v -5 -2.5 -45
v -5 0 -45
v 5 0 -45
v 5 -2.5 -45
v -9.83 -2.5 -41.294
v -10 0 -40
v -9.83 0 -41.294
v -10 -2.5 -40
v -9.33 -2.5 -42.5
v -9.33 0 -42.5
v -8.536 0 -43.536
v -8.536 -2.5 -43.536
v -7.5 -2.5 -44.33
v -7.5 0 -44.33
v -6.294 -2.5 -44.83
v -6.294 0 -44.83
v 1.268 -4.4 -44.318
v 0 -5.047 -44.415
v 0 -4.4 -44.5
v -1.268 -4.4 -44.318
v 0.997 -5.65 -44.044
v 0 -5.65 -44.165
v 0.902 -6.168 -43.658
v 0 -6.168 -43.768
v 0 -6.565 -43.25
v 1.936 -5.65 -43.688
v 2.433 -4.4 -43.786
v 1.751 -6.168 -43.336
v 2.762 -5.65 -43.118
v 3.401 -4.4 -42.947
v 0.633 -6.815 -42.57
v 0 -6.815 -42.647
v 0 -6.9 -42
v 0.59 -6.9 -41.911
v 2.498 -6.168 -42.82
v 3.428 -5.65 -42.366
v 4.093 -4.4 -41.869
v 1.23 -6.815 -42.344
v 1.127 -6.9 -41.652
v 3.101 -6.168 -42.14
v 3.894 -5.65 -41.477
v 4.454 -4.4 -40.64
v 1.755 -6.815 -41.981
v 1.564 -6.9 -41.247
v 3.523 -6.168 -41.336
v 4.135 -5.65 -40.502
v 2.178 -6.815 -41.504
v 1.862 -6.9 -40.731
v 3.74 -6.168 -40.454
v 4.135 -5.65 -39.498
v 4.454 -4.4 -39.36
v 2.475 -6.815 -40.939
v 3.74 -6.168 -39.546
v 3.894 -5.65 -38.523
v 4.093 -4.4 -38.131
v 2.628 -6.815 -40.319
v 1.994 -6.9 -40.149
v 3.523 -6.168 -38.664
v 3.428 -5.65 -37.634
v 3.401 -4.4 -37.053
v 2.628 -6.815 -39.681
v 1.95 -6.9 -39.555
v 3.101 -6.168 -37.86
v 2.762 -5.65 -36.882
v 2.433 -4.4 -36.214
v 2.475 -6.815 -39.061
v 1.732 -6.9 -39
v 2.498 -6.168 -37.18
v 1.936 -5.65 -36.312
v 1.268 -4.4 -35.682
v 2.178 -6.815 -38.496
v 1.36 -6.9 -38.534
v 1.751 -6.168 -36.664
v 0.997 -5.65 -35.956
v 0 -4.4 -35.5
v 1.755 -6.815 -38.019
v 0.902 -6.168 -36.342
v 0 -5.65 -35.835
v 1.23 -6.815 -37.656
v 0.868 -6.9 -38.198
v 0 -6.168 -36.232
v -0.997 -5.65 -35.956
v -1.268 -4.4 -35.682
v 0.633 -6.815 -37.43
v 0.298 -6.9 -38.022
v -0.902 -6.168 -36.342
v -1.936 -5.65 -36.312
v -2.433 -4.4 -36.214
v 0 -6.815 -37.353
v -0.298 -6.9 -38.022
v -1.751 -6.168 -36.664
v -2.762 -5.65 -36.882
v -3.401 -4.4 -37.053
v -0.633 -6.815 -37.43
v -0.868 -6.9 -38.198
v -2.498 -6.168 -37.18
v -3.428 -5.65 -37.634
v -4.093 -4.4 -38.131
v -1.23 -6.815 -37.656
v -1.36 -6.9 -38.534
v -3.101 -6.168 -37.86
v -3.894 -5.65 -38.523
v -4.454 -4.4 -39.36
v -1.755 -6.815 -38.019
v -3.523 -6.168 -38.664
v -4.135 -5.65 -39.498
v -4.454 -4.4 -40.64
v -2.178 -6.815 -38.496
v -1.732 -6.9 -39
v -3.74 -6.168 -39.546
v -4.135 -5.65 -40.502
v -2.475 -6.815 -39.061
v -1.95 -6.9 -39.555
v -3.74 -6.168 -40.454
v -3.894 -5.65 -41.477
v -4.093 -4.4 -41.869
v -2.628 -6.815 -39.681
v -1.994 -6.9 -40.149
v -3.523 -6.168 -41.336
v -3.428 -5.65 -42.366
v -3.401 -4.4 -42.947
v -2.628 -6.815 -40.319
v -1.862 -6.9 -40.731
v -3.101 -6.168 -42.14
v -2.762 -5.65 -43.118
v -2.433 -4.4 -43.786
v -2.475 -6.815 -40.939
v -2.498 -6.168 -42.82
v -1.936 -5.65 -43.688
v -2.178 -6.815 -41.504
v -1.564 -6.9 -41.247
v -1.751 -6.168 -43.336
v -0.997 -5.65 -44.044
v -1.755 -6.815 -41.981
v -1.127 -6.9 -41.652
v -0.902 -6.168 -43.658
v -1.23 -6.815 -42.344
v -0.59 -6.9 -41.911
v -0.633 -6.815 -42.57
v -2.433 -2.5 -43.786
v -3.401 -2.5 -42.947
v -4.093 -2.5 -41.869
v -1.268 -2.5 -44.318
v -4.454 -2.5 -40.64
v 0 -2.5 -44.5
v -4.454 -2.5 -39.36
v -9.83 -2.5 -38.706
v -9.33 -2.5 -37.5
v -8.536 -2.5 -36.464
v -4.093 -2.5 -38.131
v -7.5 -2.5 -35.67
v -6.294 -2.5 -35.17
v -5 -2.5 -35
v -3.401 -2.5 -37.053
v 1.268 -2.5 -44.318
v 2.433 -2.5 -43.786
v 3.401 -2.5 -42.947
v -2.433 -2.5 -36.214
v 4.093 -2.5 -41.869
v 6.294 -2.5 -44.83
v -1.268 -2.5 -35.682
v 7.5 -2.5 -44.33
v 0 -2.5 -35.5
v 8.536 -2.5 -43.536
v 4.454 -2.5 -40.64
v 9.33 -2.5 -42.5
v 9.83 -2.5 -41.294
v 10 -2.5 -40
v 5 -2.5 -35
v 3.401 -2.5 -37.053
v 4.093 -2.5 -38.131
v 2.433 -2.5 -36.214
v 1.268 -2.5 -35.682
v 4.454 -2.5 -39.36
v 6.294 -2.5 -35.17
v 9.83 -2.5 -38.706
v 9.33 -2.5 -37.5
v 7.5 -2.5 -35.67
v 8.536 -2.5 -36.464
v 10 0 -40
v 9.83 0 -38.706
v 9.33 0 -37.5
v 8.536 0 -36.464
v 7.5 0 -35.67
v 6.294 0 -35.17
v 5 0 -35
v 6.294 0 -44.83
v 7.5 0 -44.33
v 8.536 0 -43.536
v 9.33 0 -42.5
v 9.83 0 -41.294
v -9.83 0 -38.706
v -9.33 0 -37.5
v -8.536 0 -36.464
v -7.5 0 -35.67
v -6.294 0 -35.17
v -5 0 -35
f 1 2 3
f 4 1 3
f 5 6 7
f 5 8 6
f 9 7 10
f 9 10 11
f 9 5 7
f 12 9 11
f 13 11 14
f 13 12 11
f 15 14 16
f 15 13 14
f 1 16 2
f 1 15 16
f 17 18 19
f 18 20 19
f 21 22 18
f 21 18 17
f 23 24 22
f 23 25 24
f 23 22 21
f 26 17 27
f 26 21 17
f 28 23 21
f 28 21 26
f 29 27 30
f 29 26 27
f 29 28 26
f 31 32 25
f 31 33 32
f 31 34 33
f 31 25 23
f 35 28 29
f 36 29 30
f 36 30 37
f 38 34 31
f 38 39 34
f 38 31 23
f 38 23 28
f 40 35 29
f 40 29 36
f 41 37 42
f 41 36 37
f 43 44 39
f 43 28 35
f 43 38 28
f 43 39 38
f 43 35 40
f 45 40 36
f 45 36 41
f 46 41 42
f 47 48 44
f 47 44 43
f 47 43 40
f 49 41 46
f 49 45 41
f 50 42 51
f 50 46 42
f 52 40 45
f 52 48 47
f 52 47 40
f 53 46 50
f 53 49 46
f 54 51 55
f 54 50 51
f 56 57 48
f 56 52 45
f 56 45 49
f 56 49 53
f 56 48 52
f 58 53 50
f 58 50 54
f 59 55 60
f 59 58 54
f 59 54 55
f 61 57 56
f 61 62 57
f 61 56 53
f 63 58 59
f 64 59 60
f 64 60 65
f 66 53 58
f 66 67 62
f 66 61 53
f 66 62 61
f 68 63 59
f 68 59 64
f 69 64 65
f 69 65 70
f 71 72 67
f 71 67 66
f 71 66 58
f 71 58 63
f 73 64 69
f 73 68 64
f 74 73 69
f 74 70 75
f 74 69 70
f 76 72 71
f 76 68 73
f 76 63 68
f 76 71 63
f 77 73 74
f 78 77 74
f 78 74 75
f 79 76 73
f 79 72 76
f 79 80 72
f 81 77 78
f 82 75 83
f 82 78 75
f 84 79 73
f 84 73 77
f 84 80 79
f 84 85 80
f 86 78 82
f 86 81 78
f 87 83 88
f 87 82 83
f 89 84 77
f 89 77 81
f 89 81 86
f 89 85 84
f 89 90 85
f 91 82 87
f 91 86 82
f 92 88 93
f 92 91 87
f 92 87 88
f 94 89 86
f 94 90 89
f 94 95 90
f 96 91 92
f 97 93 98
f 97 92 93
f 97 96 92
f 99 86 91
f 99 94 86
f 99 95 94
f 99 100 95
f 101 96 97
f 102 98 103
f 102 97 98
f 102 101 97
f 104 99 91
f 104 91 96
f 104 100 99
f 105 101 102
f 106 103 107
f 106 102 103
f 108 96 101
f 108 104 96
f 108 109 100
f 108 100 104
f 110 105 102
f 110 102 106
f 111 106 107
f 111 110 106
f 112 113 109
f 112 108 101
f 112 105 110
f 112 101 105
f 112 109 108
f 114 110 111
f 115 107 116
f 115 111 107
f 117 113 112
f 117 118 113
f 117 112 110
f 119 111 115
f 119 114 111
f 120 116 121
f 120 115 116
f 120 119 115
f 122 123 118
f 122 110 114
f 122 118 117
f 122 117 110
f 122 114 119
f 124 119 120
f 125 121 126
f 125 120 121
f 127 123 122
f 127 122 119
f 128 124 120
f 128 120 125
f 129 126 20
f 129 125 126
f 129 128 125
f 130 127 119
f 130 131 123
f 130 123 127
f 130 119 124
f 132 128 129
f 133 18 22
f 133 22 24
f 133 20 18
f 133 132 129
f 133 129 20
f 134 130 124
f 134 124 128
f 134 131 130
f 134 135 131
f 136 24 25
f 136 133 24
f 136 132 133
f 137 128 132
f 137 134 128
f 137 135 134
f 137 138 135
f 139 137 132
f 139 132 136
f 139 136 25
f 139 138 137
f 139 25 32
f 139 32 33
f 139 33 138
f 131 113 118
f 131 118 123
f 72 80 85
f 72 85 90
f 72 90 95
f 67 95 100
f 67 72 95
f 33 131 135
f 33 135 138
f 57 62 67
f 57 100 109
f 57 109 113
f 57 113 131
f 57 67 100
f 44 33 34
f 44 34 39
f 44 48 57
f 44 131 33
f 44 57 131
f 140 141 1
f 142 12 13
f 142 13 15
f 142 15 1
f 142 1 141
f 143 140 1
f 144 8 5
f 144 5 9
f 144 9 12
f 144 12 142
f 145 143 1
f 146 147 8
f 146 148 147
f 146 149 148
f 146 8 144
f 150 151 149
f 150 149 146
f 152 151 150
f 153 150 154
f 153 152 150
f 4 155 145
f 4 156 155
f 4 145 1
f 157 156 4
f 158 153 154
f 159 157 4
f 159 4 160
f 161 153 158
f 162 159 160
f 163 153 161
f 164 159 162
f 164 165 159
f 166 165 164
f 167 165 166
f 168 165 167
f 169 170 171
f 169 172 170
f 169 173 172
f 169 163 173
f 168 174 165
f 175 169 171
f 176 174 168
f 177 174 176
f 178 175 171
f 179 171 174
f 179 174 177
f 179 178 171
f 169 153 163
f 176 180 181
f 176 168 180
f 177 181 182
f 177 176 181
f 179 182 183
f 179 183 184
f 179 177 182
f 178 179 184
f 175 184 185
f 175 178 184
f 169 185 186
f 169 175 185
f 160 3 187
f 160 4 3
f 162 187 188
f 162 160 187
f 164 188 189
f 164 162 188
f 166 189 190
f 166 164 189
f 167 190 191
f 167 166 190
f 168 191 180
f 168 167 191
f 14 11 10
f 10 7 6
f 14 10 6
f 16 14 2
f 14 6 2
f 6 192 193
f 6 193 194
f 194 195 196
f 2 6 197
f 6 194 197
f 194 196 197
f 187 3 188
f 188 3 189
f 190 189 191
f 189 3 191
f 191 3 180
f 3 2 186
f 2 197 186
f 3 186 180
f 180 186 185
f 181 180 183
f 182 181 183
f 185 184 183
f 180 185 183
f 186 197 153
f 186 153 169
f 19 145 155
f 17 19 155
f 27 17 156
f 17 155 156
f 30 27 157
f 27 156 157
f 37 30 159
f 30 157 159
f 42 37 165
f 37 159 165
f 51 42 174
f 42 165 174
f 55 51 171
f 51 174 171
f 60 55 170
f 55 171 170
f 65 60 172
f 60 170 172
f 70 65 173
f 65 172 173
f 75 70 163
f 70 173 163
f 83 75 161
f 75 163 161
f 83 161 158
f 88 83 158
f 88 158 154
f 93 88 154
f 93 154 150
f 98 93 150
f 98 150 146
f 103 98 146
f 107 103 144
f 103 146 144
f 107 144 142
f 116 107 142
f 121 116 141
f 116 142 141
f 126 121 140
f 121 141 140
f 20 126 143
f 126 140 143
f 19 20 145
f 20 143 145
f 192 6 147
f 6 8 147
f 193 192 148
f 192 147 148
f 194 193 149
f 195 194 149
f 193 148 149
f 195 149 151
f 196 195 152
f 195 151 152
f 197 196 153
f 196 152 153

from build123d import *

# Parameters (mm, degrees)
SKETCH2_W           = 20
SKETCH2_H           = 10
BOSS_EXTRUDE1_DEPTH = 2.5
FILLET1_R           = 5
SKETCH3_R           = 4.5
BOSS_EXTRUDE2_DEPTH = 4.4
FILLET2_R           = 2.5


with BuildPart() as part:
    # Sketch2 → Boss-Extrude1 (new body)
    with BuildSketch(Plane.XZ):
        with Locations((0, -40)):
            Rectangle(SKETCH2_W, SKETCH2_H)
    extrude(amount=BOSS_EXTRUDE1_DEPTH)

    # Fillet1
    fillet1_edges = [part.edges().sort_by_distance(p)[0] for p in [
        (-10, -1.25, -35),
        (-10, -1.25, -45),
        (10, -1.25, -45),
        (10, -1.25, -35),
    ]]
    fillet(fillet1_edges, radius=FILLET1_R - 0.0001)  # a hair under: the kernel refuses the full size

    # Sketch3 → Boss-Extrude2 (add)
    with BuildSketch(Plane.XZ.offset(2.5)):
        with Locations(Location((0, -40, 0), (0, 0, 270))):
            Circle(SKETCH3_R)
    extrude(amount=BOSS_EXTRUDE2_DEPTH)

    # Fillet2
    fillet2_edges = [part.edges().sort_by_distance(p)[0] for p in [
        (0, -6.9, -35.5),
    ]]
    fillet(fillet2_edges, radius=FILLET2_R)


solid = part.part
